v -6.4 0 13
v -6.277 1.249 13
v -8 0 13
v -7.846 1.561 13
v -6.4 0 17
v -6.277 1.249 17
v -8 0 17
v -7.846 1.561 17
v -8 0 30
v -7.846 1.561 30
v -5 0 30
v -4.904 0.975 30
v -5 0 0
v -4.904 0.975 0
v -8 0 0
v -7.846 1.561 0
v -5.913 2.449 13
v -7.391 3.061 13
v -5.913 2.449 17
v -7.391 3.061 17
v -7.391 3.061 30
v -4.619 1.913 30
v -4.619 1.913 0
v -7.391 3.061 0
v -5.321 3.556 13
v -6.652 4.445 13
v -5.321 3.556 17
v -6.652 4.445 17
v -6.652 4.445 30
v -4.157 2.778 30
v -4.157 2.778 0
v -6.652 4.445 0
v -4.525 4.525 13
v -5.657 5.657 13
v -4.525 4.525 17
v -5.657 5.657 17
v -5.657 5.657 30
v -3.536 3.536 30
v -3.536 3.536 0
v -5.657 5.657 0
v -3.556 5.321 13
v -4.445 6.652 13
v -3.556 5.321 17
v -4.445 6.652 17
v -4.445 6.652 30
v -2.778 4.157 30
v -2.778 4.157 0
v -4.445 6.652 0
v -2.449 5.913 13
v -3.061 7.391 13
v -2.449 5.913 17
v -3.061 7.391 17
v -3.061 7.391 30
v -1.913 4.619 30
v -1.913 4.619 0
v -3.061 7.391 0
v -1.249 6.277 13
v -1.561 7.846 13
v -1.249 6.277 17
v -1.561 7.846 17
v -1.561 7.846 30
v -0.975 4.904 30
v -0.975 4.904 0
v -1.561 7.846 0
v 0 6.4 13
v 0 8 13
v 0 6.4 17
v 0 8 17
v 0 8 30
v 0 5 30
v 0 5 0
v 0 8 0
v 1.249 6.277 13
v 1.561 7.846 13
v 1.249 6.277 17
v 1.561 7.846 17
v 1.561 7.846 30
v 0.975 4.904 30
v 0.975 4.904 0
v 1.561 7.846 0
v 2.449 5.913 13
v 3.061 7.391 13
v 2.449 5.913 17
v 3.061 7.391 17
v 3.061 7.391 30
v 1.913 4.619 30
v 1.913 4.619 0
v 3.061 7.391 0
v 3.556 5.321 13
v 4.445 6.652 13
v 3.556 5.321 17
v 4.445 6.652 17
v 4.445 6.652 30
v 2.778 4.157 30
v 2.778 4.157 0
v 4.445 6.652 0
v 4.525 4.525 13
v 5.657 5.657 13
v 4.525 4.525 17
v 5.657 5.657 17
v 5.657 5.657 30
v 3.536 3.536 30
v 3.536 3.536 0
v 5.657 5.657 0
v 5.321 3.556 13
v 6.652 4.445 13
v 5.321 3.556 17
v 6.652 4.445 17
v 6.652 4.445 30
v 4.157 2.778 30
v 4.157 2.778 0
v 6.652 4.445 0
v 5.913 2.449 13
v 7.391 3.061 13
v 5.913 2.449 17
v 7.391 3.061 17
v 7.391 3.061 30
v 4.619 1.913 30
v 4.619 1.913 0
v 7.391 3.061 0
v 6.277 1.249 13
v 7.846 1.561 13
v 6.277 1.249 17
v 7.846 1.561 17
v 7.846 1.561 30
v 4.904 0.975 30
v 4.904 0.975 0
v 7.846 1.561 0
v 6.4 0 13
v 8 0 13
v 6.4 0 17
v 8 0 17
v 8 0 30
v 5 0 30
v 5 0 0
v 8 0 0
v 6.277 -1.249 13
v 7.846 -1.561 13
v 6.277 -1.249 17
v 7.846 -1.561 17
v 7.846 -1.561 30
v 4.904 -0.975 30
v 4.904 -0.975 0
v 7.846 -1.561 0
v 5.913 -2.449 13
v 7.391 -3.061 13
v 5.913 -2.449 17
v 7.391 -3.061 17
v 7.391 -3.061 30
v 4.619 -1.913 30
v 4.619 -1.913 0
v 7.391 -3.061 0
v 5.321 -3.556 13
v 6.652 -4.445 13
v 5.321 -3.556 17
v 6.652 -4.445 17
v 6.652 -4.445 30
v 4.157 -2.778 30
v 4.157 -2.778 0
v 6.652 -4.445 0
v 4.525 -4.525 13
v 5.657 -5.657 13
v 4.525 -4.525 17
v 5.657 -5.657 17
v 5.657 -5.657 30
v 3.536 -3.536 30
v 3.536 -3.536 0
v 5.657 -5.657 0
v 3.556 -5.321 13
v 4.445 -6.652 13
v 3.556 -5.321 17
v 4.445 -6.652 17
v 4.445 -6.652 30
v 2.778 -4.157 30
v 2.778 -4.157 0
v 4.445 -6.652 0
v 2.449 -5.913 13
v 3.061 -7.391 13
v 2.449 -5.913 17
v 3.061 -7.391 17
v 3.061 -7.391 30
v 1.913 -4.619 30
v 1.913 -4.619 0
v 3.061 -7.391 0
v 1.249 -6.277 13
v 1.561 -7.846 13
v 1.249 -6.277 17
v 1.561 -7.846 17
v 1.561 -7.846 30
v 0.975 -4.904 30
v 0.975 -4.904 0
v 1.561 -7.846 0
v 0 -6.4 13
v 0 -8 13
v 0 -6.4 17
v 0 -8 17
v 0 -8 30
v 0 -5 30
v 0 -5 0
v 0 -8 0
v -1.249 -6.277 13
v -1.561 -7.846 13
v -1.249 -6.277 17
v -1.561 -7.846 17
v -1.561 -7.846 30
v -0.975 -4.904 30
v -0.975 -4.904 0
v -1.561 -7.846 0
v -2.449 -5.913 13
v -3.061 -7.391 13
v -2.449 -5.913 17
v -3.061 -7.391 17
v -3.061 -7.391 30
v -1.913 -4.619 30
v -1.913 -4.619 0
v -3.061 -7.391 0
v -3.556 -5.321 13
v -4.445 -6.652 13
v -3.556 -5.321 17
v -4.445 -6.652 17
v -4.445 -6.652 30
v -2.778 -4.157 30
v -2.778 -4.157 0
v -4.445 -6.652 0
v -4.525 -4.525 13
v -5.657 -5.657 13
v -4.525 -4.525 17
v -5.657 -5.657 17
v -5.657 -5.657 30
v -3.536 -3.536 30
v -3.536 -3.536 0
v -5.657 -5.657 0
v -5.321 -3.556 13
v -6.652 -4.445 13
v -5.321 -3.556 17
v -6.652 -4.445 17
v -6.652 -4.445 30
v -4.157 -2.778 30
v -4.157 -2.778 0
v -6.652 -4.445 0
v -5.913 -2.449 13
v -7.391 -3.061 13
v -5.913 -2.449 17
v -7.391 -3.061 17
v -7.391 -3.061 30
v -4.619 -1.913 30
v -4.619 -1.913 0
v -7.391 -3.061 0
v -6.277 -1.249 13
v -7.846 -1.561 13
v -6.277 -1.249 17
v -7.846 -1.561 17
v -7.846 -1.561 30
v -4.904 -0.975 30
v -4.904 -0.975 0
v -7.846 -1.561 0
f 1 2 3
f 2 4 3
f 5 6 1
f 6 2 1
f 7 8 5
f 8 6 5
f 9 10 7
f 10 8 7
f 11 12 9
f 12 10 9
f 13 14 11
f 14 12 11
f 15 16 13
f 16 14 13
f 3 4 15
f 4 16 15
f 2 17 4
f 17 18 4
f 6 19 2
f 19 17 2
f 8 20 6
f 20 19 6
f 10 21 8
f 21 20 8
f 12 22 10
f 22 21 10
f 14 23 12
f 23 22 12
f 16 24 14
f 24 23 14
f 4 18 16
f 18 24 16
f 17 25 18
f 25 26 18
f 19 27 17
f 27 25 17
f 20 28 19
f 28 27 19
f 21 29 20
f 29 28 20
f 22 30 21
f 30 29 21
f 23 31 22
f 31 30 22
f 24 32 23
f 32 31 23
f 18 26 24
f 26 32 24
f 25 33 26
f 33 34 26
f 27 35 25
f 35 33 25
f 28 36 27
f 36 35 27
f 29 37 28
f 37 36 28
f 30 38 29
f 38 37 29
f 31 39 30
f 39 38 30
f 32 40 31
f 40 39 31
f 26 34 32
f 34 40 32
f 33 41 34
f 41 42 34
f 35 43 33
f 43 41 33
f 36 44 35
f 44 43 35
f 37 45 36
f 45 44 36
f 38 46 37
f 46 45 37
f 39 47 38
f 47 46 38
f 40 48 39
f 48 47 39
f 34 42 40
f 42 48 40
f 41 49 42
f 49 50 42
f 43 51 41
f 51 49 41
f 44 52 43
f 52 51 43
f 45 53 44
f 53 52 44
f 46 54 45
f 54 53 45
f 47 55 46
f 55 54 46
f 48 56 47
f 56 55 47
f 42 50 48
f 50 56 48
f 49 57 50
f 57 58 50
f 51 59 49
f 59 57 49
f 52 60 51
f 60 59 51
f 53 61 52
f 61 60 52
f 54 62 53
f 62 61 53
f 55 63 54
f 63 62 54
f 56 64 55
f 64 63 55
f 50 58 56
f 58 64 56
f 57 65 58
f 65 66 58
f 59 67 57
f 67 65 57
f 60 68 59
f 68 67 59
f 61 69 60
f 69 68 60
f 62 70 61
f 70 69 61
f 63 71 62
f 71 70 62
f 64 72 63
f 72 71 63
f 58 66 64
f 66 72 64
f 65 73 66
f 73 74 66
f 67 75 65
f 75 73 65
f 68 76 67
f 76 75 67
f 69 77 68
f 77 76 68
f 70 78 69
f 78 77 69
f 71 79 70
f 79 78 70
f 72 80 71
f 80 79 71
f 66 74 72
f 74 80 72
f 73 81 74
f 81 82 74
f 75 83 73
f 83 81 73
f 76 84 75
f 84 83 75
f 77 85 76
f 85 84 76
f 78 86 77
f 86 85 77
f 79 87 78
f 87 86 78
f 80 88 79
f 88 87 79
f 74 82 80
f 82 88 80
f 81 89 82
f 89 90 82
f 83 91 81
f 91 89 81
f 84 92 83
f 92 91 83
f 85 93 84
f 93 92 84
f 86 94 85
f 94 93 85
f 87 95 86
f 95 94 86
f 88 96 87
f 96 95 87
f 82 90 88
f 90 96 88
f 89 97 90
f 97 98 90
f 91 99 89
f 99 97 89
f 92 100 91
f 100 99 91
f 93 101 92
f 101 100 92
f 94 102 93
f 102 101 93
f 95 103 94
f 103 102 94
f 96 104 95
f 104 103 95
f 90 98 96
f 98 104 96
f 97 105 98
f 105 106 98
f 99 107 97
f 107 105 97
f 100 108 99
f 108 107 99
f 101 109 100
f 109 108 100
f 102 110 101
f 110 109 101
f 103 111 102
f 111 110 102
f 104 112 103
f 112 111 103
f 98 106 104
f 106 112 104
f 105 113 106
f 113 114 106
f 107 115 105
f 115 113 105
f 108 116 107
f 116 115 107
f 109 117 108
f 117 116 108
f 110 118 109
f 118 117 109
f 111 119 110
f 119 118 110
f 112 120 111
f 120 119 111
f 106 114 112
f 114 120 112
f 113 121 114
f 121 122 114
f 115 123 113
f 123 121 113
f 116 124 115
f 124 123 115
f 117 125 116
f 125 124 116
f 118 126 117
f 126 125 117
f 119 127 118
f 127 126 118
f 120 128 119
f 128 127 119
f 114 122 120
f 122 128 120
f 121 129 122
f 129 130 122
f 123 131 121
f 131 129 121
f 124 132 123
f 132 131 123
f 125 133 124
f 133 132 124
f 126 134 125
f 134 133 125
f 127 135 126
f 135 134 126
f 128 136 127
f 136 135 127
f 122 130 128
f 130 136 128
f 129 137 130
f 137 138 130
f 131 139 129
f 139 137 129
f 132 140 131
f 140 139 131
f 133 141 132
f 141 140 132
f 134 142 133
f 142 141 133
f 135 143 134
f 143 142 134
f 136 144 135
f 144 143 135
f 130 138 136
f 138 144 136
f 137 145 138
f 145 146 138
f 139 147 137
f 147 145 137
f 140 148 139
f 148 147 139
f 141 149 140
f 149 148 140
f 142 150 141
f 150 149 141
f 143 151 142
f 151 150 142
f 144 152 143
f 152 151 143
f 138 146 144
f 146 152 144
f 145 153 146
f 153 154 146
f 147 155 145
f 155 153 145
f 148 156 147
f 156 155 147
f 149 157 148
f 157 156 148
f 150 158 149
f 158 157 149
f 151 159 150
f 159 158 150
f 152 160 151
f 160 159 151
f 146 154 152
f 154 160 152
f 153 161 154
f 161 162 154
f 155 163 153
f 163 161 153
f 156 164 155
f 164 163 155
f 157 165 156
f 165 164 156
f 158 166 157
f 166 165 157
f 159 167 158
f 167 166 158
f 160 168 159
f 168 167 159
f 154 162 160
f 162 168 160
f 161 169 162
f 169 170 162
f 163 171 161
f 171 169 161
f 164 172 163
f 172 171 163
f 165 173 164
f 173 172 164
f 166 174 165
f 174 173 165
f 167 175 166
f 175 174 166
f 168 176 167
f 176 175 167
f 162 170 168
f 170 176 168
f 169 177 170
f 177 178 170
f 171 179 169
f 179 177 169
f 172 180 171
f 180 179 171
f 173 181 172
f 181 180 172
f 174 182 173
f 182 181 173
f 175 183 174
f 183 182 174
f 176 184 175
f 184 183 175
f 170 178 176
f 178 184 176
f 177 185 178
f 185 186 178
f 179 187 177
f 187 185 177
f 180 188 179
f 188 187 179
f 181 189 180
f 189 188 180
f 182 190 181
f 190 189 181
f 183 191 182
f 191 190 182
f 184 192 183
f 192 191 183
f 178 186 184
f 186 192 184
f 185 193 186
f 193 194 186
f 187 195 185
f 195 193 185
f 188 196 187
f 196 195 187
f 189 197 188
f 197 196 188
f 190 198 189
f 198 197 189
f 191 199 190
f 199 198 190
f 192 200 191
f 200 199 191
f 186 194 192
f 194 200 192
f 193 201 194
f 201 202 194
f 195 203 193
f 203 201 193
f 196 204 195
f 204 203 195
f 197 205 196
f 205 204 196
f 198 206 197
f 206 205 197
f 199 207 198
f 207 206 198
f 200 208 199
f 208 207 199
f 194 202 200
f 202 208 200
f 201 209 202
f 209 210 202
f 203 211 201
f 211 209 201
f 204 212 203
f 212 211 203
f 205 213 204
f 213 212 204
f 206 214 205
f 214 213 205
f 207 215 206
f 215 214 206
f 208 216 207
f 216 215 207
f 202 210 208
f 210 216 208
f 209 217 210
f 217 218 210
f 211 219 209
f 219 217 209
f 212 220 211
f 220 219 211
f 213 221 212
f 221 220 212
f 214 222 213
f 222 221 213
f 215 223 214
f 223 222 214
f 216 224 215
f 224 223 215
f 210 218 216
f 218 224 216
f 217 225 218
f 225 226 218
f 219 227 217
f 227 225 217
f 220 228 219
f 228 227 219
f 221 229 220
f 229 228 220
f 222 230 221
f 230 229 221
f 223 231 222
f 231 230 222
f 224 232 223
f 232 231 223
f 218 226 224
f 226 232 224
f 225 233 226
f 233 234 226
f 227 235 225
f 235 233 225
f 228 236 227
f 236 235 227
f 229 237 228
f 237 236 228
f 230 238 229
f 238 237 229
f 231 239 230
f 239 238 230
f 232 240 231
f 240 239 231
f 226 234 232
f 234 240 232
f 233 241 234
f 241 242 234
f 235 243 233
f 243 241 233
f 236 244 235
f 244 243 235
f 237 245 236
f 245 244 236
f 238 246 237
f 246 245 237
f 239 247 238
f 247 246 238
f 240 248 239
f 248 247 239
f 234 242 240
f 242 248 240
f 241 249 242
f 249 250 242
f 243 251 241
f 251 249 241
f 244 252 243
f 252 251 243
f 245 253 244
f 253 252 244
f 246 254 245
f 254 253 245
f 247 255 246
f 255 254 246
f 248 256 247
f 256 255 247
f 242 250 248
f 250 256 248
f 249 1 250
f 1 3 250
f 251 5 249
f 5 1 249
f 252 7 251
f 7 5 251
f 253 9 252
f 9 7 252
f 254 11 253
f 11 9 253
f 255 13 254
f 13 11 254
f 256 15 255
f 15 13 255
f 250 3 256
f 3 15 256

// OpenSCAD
$fn = 32;

// ----------------------------------------------------------------------
// Grooved revolve: stepped, bore R5
// ----------------------------------------------------------------------

// --- parameters (mm) ---
bore_r = 5;               // bore radius
outer_r = 8;              // outer radius of the body
total_h = 30;             // overall height, Z
wall = 3;                 // radial wall thickness
groove_w = 4;             // groove width
groove_d = 1.6;           // groove depth
grooves = 1;              // number of outer grooves

bbox_x = 2 * outer_r;  // full diameter
bore_d = 2 * bore_r;  // bore diameter
body_d = 2 * outer_r;  // body diameter
revolve_angle = 360;  // full turn around the Z axis

profile = [[5, 0], [8, 0], [8, 13], [6.4, 13], [6.4, 17], [8, 17], [8, 30], [5, 30]];  // primary outline, 8 points, counter clockwise

// --- the one profile operation ---
rotate_extrude(angle = revolve_angle) polygon(points = profile);
